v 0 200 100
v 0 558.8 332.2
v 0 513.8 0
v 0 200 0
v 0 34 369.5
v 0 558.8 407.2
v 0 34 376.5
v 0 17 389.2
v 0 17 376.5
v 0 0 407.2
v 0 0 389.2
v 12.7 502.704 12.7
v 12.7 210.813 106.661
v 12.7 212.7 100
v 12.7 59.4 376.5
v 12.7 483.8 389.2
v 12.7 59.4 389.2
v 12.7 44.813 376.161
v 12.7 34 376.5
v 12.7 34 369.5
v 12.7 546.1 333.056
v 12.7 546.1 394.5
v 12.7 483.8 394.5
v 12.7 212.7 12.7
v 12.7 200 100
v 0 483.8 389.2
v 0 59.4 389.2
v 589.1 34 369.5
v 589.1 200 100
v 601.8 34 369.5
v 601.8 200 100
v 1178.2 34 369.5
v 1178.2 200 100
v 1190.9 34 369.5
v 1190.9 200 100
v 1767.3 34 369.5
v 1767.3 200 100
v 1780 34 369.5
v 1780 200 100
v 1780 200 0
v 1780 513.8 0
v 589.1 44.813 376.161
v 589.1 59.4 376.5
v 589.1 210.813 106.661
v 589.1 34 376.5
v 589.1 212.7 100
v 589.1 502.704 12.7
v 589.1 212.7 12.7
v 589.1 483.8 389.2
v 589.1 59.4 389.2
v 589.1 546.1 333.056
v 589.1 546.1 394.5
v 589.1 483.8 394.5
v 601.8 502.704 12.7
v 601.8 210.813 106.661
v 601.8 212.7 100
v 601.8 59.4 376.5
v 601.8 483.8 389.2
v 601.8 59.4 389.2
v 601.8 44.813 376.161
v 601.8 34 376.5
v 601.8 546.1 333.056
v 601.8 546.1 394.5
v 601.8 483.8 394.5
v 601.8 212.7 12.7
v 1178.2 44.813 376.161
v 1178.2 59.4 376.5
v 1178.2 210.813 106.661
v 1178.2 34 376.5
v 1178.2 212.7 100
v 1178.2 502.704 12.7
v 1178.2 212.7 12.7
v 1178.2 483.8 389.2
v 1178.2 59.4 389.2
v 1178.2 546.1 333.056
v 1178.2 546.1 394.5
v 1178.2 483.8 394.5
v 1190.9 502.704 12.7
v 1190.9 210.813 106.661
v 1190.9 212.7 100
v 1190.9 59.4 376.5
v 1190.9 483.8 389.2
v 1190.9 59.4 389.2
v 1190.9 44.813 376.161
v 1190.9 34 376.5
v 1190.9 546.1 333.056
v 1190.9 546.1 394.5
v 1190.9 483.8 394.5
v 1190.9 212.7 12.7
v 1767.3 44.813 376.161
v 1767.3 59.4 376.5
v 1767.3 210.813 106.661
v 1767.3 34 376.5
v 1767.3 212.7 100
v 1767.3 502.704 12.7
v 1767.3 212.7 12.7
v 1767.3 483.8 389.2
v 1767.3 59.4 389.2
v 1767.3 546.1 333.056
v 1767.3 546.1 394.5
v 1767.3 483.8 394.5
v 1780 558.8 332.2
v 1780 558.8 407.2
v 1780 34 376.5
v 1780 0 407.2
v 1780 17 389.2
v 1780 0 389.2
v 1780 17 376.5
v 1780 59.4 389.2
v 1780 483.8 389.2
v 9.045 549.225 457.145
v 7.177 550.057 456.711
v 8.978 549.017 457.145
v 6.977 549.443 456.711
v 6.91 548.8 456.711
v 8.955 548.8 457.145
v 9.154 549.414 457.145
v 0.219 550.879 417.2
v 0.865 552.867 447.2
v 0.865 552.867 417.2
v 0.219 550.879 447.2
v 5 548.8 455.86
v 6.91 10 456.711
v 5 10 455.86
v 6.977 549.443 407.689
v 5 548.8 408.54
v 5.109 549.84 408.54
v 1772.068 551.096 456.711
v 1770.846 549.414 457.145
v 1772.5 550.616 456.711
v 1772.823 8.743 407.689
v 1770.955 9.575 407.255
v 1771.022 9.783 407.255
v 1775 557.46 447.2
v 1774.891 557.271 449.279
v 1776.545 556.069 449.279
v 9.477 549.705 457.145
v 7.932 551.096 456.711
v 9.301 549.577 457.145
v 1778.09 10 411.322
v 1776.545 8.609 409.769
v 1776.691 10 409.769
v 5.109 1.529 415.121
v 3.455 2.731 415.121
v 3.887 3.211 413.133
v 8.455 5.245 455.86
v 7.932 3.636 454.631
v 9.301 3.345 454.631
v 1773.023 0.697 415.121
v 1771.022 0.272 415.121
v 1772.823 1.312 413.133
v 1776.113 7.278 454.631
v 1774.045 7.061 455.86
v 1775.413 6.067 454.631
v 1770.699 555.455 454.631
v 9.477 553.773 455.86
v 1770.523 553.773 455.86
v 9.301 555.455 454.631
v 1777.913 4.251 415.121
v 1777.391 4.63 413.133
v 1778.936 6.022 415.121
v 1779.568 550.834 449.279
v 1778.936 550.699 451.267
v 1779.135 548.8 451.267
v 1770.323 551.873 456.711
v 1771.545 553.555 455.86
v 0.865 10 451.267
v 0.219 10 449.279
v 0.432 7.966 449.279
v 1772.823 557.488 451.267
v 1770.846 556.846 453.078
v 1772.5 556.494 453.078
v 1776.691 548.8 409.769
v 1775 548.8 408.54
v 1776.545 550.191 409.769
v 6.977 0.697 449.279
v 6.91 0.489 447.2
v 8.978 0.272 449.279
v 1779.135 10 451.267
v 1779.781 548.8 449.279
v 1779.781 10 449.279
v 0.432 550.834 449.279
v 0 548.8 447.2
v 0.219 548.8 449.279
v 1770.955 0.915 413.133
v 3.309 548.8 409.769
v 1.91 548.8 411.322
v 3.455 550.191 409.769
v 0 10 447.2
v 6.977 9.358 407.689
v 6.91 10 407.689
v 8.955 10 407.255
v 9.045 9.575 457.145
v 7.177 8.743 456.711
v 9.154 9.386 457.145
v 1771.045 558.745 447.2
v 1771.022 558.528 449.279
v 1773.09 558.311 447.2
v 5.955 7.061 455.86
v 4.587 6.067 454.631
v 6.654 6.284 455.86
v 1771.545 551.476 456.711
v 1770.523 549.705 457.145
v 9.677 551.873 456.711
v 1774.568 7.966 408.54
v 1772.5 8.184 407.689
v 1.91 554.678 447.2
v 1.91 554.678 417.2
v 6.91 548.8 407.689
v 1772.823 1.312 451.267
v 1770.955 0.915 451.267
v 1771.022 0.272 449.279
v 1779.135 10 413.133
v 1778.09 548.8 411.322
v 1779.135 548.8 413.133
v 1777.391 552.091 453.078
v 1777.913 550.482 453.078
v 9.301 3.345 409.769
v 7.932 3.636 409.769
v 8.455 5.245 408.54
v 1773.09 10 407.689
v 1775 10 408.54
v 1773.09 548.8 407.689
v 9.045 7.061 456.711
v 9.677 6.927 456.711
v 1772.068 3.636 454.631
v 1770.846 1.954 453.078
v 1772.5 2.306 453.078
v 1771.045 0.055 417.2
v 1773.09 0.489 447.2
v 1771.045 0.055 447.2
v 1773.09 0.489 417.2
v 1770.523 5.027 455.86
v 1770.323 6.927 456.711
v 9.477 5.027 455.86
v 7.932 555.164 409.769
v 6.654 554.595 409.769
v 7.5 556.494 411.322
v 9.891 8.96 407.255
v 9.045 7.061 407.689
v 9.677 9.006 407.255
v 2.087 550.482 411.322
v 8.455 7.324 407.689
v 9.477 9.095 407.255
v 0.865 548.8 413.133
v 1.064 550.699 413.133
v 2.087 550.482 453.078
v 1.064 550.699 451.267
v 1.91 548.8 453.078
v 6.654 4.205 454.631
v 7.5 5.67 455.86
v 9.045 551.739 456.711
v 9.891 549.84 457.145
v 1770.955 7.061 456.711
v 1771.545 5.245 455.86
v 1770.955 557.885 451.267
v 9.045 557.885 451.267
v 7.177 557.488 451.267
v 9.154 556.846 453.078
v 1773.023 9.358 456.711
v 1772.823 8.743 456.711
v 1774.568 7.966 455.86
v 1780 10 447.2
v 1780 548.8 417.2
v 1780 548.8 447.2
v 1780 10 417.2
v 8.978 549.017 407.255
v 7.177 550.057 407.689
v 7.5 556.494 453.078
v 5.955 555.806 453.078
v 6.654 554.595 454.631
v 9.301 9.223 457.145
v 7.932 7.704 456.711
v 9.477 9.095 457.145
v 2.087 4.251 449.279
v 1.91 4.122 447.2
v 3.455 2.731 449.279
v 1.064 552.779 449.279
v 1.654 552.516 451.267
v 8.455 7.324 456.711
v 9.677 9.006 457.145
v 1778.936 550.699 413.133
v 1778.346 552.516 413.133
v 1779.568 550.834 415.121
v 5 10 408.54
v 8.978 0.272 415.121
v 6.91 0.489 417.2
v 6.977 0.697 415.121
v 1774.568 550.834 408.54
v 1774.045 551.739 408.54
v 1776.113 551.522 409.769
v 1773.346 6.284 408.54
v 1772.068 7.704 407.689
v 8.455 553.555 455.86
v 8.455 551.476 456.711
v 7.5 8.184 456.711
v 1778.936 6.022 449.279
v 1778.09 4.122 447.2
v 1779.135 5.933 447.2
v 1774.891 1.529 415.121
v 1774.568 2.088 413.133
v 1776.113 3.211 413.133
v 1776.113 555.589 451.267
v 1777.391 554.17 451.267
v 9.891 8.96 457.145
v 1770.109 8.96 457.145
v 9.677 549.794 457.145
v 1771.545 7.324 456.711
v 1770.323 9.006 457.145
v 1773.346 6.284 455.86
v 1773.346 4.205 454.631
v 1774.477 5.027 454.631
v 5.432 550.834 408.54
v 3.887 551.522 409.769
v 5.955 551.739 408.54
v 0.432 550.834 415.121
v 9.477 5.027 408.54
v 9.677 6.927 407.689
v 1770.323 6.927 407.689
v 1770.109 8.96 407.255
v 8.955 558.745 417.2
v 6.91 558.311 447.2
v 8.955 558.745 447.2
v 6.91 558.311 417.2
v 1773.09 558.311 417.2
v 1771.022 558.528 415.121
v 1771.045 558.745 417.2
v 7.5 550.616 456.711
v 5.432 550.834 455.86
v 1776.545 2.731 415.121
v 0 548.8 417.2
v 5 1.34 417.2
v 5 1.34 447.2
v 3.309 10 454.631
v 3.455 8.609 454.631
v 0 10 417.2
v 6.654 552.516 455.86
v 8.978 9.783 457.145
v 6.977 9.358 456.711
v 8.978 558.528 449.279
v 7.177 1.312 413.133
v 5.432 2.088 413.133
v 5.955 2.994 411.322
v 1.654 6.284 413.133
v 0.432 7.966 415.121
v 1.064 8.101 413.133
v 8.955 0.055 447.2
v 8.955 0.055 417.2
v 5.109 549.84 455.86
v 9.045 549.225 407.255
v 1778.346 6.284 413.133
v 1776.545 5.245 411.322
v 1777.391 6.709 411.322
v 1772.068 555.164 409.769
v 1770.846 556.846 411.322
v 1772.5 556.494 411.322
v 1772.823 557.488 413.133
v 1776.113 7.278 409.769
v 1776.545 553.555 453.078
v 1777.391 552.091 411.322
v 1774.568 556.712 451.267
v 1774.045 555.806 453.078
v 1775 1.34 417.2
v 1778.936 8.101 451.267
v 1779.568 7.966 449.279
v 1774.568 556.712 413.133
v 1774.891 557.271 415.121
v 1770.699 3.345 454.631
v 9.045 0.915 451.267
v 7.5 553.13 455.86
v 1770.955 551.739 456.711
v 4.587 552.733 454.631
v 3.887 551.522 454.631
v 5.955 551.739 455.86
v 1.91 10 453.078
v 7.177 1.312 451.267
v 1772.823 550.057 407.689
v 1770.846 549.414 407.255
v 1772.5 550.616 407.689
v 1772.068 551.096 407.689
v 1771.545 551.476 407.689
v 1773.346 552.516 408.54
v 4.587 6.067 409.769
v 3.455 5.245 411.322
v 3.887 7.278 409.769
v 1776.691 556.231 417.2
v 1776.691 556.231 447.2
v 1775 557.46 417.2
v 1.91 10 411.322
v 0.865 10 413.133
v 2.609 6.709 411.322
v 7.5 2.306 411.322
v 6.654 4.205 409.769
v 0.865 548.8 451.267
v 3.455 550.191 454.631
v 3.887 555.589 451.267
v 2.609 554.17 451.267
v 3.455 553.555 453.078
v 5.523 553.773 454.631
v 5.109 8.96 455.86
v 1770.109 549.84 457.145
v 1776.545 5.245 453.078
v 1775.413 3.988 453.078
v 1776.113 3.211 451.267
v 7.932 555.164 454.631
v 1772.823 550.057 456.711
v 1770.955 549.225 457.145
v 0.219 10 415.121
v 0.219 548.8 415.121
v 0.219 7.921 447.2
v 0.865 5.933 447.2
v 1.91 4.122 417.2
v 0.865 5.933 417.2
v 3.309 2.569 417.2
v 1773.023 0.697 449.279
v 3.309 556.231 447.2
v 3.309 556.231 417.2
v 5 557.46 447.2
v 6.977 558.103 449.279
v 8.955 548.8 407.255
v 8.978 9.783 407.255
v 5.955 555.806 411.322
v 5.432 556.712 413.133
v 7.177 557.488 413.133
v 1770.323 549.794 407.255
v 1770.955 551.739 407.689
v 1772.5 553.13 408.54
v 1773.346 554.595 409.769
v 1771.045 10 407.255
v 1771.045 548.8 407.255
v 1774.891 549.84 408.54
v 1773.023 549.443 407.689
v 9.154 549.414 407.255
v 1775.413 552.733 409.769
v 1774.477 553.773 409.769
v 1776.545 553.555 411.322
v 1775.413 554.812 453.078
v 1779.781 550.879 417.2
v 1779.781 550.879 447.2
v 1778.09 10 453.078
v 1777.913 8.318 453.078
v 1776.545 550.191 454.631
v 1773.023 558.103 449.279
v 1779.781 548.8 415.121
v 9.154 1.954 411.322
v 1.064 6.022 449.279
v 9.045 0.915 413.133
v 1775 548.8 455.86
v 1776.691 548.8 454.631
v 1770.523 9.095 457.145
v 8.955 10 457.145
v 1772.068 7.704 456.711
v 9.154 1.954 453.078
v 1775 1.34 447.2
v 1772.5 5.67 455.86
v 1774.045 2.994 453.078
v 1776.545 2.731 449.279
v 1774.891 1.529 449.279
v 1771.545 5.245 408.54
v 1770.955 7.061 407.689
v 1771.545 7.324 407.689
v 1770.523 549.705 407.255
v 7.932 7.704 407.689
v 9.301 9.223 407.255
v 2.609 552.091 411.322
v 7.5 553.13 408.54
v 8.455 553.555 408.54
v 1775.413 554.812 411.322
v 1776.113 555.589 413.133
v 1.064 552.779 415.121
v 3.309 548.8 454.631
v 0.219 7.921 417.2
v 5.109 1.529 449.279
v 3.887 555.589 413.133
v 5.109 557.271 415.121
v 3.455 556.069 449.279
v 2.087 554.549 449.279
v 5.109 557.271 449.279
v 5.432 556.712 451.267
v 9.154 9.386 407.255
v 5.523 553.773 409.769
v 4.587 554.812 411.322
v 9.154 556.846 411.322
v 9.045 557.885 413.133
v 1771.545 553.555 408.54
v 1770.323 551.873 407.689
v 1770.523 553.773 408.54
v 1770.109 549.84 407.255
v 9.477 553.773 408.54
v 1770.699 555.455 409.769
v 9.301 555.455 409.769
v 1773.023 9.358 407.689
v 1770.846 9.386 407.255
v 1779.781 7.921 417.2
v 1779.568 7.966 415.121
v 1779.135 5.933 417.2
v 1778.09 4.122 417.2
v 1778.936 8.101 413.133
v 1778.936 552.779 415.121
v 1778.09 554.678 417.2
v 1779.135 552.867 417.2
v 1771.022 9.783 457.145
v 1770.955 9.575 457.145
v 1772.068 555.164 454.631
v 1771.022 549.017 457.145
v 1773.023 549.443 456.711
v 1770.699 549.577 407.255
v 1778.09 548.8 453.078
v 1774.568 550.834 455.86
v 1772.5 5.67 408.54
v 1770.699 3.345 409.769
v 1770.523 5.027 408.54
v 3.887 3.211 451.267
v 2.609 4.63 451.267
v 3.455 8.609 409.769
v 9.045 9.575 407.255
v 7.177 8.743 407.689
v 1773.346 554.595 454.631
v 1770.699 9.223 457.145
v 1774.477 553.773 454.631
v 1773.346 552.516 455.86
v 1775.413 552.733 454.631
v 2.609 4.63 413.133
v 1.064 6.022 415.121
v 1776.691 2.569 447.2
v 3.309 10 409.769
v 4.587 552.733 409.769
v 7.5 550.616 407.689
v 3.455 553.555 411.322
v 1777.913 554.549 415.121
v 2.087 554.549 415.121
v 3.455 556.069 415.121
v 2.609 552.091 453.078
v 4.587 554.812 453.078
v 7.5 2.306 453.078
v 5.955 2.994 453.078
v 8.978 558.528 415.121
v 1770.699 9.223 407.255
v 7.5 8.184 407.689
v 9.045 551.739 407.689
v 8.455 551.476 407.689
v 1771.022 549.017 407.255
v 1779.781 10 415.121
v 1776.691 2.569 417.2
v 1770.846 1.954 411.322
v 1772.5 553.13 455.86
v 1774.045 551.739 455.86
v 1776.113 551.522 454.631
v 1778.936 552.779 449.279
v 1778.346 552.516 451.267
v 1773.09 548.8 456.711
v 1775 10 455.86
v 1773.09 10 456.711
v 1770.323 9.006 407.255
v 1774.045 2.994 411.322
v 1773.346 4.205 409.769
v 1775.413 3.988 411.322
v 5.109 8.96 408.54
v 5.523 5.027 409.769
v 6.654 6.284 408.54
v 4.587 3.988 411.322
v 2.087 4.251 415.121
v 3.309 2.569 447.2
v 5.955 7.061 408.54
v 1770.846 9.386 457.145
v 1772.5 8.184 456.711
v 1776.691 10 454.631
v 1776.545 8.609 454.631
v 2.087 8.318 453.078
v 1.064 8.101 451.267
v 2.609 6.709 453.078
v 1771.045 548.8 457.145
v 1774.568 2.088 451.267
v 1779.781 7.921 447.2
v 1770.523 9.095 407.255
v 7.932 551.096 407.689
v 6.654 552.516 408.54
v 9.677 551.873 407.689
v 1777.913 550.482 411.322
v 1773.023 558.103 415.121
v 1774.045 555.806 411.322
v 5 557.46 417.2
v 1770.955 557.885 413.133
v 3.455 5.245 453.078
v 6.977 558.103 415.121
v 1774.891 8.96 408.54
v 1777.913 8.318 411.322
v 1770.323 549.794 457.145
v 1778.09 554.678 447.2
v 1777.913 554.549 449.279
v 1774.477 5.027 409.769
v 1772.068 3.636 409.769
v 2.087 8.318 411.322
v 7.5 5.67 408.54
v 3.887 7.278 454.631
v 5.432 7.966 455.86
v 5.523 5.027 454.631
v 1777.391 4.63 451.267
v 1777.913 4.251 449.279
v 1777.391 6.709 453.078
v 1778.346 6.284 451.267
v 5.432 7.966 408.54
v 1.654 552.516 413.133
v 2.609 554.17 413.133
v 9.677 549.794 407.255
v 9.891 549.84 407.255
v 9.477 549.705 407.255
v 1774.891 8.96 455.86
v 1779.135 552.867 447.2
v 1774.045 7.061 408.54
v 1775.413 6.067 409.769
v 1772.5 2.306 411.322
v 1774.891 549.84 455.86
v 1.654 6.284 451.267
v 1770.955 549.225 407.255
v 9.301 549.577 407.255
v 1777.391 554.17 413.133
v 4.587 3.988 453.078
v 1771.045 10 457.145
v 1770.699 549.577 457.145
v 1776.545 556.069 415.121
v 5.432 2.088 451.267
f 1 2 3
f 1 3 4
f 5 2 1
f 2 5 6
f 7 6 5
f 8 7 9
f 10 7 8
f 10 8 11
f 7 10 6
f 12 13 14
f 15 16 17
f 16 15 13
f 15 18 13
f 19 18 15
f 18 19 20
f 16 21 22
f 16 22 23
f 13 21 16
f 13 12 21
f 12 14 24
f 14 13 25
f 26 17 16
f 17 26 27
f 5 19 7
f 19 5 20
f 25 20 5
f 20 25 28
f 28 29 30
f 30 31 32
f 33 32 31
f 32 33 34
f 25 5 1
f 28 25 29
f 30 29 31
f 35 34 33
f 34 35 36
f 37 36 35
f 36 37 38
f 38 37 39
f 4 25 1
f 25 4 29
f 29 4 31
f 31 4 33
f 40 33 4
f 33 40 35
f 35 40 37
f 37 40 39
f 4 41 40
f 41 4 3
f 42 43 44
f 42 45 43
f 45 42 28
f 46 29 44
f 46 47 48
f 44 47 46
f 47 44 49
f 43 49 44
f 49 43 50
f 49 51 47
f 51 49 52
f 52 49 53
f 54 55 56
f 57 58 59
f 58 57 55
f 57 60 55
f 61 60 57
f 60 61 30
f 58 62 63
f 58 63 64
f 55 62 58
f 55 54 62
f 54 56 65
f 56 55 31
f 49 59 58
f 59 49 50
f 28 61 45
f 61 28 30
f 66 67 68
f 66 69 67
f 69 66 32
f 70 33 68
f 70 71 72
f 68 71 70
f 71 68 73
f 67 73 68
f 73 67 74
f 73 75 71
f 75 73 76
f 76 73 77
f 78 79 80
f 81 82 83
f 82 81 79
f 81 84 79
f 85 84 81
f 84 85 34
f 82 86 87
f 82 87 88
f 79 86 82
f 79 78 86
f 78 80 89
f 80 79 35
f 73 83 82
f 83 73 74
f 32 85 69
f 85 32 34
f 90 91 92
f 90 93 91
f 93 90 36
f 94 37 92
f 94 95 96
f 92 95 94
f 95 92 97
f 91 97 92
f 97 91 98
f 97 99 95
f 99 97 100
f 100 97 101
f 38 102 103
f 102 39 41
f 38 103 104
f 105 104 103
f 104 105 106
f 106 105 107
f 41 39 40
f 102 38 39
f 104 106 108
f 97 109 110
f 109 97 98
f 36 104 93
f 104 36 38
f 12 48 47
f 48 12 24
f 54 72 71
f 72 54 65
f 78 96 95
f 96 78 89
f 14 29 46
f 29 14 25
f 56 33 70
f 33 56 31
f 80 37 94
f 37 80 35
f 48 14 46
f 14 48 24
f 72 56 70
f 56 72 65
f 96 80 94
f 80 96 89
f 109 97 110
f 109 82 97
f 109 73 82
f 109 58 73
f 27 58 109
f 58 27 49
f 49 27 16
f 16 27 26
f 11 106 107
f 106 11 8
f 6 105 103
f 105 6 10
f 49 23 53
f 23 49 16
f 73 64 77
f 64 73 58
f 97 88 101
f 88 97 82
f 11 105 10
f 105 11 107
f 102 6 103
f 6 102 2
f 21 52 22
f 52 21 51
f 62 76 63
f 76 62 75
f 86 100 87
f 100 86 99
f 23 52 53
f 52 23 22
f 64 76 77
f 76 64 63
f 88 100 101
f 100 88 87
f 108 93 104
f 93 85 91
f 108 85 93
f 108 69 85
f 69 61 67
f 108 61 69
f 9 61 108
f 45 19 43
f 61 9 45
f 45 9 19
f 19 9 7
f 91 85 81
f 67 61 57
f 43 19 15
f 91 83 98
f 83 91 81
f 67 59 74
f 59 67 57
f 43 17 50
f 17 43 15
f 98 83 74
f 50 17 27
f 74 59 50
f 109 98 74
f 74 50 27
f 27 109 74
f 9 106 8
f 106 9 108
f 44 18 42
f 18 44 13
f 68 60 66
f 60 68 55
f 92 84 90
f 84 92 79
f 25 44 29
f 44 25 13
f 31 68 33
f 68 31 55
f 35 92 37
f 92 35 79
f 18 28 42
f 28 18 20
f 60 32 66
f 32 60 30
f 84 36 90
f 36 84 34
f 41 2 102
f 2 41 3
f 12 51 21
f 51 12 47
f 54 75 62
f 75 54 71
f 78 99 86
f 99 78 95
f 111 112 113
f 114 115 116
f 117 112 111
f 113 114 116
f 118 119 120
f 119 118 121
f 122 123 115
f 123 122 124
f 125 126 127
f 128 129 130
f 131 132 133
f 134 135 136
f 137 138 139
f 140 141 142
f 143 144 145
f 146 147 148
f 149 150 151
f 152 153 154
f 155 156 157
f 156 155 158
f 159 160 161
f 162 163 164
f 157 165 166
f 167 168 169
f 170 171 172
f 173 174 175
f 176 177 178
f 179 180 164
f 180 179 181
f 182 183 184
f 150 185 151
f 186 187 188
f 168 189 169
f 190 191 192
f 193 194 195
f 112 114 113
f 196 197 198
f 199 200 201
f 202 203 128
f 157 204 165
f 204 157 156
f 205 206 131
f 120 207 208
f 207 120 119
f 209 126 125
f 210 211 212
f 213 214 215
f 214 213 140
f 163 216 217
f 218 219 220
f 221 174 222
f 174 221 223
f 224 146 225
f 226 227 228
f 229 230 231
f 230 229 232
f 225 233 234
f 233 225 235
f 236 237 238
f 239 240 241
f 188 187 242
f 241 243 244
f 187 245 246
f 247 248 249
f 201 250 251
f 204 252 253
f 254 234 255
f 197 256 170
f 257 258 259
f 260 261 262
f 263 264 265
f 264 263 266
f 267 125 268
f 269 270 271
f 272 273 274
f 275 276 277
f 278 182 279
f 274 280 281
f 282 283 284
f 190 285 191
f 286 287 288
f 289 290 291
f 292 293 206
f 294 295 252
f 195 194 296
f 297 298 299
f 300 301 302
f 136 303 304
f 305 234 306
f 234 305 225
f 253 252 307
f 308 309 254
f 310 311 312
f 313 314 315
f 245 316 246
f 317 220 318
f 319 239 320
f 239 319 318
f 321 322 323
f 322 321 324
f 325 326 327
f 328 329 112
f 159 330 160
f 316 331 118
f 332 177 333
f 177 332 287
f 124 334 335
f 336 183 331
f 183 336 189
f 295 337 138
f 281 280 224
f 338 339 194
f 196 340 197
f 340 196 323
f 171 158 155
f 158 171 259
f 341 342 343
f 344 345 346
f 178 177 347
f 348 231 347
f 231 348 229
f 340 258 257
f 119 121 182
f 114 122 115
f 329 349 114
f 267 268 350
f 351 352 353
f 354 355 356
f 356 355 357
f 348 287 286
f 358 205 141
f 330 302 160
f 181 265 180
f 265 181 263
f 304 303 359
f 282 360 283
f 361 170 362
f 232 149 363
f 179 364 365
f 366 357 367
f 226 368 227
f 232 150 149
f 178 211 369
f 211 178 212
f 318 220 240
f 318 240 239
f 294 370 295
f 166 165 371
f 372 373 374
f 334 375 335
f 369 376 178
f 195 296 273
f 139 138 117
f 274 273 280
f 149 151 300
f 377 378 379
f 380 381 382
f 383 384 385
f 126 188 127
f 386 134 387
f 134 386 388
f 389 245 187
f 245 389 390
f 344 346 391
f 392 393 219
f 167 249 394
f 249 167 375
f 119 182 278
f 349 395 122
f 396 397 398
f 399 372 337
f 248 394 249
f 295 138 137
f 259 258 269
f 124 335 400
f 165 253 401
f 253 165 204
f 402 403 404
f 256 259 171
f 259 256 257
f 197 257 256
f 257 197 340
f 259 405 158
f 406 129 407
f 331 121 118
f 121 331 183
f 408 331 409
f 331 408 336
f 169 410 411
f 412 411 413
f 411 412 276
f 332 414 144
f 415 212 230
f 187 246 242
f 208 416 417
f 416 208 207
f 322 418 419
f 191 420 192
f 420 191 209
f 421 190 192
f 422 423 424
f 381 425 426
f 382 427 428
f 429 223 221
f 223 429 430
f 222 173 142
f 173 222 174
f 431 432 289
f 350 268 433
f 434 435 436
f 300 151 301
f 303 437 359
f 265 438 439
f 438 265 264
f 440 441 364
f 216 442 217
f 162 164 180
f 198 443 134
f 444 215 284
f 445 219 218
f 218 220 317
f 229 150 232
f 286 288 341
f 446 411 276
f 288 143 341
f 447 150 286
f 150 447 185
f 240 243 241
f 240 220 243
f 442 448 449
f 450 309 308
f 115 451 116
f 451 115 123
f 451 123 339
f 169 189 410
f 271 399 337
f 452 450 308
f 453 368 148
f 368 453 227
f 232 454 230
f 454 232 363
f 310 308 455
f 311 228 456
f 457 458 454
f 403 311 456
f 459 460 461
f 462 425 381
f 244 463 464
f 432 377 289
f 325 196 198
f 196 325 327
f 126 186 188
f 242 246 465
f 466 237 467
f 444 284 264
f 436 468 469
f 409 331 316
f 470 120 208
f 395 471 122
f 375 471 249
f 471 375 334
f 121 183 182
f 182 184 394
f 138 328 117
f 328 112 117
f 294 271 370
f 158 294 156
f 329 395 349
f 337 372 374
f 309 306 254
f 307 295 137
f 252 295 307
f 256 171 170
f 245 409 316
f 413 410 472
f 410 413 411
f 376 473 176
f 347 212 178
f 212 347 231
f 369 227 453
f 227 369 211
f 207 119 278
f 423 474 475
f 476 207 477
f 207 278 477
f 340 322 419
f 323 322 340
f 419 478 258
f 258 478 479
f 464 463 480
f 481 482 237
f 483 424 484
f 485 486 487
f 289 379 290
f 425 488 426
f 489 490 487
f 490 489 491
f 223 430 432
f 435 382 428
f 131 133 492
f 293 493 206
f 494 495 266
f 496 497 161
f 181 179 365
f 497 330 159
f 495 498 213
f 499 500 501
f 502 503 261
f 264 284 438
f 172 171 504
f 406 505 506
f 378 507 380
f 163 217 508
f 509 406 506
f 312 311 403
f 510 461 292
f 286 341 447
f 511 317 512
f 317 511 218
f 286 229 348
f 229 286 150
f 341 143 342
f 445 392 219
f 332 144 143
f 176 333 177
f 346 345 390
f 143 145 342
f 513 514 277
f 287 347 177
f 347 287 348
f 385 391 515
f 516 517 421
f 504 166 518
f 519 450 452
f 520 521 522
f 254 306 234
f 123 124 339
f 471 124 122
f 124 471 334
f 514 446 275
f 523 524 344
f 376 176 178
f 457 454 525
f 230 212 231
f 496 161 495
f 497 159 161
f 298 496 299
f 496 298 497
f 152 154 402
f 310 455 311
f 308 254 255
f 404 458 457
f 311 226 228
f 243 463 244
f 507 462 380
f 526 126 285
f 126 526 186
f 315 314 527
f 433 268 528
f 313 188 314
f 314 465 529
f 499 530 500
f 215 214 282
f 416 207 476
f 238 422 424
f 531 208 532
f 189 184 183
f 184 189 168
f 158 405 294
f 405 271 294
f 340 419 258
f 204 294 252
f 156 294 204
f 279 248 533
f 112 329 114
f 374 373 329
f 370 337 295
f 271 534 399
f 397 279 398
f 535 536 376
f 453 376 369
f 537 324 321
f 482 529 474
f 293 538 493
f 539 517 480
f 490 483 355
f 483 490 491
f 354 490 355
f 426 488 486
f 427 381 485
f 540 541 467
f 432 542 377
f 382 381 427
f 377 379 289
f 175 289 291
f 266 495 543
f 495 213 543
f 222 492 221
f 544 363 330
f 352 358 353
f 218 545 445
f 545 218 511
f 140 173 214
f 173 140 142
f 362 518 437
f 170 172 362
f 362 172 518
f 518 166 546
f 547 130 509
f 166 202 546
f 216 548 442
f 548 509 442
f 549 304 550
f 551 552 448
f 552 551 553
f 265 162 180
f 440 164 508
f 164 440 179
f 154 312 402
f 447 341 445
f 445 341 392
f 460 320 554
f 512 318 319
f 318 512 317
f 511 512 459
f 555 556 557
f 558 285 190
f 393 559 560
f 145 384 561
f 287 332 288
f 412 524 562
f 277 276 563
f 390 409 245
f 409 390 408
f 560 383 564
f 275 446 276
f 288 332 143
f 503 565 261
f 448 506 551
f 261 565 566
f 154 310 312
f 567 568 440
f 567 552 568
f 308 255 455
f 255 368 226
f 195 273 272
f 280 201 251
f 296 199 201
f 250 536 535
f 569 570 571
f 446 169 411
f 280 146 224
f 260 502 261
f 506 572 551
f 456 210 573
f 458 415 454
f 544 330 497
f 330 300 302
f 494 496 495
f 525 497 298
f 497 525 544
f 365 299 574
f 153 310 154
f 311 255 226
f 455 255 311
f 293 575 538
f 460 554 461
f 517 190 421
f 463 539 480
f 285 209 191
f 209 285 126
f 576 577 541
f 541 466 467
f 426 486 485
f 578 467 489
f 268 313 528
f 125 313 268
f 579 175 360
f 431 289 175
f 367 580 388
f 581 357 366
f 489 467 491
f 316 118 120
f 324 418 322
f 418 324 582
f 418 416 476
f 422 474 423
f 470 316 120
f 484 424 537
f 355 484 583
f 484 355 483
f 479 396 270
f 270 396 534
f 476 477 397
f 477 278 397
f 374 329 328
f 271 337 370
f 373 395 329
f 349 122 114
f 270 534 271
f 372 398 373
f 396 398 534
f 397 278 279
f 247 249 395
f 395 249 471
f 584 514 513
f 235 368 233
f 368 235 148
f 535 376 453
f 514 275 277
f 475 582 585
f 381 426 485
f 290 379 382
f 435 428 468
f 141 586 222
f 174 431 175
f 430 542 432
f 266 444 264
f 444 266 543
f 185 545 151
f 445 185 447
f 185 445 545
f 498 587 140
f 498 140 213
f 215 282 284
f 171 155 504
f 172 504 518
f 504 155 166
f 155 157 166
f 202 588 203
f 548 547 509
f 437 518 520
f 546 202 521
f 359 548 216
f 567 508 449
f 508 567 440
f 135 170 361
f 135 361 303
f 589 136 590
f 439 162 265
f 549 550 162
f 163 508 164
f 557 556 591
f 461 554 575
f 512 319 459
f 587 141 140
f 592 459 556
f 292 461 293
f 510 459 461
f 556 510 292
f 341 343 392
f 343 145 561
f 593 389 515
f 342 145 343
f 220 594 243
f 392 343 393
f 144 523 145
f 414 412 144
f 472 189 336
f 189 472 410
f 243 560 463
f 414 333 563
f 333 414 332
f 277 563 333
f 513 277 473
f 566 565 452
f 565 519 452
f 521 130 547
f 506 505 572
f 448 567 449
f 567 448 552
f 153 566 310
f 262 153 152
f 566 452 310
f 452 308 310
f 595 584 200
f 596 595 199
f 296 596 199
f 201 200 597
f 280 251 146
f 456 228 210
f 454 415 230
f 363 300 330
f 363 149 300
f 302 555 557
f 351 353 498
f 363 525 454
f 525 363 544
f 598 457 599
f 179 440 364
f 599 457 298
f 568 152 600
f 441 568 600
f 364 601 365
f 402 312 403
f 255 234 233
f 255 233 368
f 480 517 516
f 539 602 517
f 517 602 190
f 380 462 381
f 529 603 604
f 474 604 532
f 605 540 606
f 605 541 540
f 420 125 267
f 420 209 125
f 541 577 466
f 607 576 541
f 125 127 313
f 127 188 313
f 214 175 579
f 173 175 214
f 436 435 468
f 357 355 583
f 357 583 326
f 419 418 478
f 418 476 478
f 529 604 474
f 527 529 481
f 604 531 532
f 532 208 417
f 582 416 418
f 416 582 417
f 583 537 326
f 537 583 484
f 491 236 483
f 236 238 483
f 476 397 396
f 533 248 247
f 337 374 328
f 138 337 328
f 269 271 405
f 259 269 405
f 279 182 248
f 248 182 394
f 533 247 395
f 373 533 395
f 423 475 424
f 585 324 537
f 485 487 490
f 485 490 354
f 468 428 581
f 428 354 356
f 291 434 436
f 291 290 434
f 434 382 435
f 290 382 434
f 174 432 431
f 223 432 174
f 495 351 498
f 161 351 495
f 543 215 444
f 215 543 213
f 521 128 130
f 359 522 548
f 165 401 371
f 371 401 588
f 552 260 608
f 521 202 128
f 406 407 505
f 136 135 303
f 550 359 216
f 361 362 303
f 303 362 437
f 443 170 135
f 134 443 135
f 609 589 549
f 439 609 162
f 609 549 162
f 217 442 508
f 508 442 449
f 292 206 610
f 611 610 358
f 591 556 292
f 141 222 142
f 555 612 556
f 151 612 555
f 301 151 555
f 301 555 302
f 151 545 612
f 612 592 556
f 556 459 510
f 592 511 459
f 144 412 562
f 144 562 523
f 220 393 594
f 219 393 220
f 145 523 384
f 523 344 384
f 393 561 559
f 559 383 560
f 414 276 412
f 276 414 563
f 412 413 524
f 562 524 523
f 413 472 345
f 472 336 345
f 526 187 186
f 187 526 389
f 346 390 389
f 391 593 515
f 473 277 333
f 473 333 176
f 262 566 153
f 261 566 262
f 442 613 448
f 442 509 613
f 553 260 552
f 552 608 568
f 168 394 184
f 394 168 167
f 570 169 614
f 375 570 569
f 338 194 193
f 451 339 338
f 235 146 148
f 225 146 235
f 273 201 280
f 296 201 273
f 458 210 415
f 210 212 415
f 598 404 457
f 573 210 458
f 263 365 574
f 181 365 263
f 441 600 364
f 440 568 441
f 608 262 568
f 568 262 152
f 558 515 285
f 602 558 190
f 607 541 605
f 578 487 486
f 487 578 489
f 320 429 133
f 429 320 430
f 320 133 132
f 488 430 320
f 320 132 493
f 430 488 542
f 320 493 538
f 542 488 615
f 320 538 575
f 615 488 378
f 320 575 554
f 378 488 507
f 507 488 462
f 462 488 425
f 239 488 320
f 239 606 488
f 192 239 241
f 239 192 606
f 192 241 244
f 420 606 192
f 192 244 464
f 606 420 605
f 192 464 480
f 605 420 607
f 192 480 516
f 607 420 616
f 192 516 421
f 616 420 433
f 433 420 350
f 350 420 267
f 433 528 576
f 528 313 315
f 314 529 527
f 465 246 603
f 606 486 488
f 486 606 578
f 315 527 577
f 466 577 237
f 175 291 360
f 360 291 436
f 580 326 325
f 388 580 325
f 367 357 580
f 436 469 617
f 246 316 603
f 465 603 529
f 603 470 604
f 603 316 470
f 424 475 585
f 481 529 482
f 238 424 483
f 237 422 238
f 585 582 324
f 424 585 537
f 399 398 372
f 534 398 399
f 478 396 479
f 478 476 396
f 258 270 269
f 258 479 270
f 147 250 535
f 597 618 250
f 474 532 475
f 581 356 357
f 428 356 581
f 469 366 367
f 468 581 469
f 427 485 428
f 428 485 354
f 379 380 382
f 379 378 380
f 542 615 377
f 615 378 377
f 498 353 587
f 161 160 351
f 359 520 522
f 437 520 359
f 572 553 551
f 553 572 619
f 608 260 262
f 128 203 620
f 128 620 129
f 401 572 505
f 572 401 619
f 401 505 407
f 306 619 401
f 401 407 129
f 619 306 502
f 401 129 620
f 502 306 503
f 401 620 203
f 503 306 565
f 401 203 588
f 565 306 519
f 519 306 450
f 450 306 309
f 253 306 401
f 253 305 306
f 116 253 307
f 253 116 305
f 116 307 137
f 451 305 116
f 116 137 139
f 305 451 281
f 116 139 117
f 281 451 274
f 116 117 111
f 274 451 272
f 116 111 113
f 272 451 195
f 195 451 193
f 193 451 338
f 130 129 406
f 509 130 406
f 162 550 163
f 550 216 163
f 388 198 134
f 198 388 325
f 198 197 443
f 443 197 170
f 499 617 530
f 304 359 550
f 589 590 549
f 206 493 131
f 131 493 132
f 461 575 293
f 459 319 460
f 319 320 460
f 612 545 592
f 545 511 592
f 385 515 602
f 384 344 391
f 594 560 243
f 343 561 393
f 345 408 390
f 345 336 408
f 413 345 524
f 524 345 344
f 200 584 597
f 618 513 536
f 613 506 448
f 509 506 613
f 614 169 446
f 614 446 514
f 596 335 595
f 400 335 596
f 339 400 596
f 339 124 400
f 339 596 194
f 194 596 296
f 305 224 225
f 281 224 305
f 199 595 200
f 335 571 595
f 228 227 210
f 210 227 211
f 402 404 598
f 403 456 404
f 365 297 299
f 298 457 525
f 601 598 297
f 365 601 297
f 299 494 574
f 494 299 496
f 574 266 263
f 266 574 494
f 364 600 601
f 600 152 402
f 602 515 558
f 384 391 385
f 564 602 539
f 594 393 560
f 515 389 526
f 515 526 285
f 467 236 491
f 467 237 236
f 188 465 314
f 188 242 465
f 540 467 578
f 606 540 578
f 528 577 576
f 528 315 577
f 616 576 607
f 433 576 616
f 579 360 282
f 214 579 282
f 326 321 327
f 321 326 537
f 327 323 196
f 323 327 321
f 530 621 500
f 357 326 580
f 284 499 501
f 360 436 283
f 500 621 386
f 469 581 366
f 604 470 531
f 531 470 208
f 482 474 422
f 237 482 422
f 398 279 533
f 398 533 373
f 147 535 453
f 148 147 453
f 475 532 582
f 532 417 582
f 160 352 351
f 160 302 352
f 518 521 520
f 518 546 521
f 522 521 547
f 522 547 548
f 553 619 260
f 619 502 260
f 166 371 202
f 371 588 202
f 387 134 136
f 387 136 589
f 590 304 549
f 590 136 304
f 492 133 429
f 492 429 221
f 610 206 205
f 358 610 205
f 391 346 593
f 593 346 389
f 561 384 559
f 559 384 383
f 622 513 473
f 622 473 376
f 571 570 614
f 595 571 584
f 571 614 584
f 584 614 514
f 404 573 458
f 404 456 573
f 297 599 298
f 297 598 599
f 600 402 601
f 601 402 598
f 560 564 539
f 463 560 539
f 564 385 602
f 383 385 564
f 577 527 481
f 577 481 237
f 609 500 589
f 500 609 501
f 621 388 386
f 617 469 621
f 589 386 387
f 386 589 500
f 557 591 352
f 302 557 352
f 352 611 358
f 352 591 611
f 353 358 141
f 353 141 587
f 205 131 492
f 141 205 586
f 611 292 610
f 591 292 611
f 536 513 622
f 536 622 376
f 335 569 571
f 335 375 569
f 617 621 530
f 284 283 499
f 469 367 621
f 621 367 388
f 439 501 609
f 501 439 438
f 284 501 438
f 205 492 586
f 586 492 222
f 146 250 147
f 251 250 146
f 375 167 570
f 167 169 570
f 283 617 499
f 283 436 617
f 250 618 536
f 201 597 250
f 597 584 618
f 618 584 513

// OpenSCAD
in=25.4;
pad=0.1;
zero=0.001;


//70.07 in
right_width=1780;

//90.55 in
left_width=2300;

wood=in/2;

cusion=50;
cusion_x=right_width;
cusion_y=22*in;
cusion_z=cusion;

bench_height=18*in-cusion;
bench_depth=22*in;

roborock=100;

lid_wood=18;

led_x=17;
led_y=7;

front_base=roborock;
front_top=lid_wood+wood+led_y;
front_inset=200;
//front_inset=10*in;
front_lip=led_x;

lip=cusion*1.5;
back_inset=45;
back_base=zero;
back_top=lip;

bo=back_inset;
ba=bench_height-back_top;
back_angle=atan(bo/ba);
bh=ba/cos(back_angle);

base_y=bench_depth-front_inset-back_inset;

lid=bench_depth-lip;

// s=o/h c=a/h t=o/a
fo=bench_height-lid_wood-front_base-wood-led_y;
fa=front_inset-led_x-front_lip;
front_angle=atan(fo/fa);

fh=fa/cos(front_angle);

led_holder=led_x+in;

module dirror_x(x=0) {
    children();
    translate([x,0,0])
    mirror([1,0,0])
    children();
}

module dirror_y(y=0) {
    children();
    translate([0,y,0])
    mirror([0,1,0])
    children();
}

module side() {
	difference() {
		side_positive();

		translate([-pad,bench_height-lid_wood])
		square([lid+pad,lid_wood+pad]);

		//square([front_lip,bench_height]);
	}

	*color("orange")
	translate([front_lip,bench_height-lid_wood-led_y-wood])
	square([led_x,led_y]);
}

//zero=10;

module led_holder(width) {
	square([width,led_holder]);
}


module side_positive() {
	hull() {
		translate([led_x+front_lip,bench_height-front_top])
		square([zero,front_top]);

		translate([bench_depth-zero,bench_height-back_top])
		square([zero,back_top]);

		translate([front_inset,front_base])
		square([zero,zero]);

		translate([bench_depth-back_inset-zero,back_base])
		square([zero,zero]);
	}
	translate([front_inset,0])
	square([bench_depth-front_inset-back_inset,bench_height-pad]);
}

module base(width) {
	square([width,base_y]);
}

module front_base(width) {
	square([width,front_base]);  // trig
}

module back_top(width) {
	square([width,back_top]);  // trig?
}

module lid(width) {
	square([width,lid]);
}

module lip(width) {
	square([width,lip]);
}

module wood(height=wood) {
	linear_extrude(height=height)
	children();
}

ribs=4;


module front_face(width) {
	square([width,fh]);
}

module back_face(width) {
	square([width,bh]);
}

module assembled(width=right_width) {
	color("blue")
	for(x=[wood/2:(width-wood)/(ribs-1):width-wood/2])
	translate([x-wood/2,0])
	rotate([90,0,90])
	wood()
	side();

	color("red")
	translate([0,front_inset])
	wood()
	base(width);

	color("lime")
	translate([0,front_inset+wood])
	rotate([90,0])
	wood()
	front_base(width);

	color("magenta")
	translate([0,0,bench_height-lid_wood])
	wood(lid_wood)
	lid(width);

	color("lime")
	translate([0,bench_depth,bench_height-back_top])
	rotate([90,0])
	wood()
	back_top(width);

	color("red")
	translate([0,bench_depth-lip,bench_height-wood])
	wood()
	lip(width);

	translate([0,front_lip,bench_height-wood-lid_wood])
	wood()
	led_holder(width);

	color("cyan")
	translate([0,front_inset,front_base])
	rotate([-front_angle,0])
	translate([0,-fh])
	wood()
	front_face(width);

	translate([0,bench_depth-back_inset])
	rotate([90-back_angle])
	wood()
	back_face(width);

	#translate([cusion_r,cusion_r,cusion_r+bench_height])
	minkowski() {
		cube([cusion_x-cusion_r*2,cusion_y-cusion_r*2,cusion_z-cusion_r*2]);
		sphere(r=cusion_r);
	}

}

cusion_r=10;

assembled();
